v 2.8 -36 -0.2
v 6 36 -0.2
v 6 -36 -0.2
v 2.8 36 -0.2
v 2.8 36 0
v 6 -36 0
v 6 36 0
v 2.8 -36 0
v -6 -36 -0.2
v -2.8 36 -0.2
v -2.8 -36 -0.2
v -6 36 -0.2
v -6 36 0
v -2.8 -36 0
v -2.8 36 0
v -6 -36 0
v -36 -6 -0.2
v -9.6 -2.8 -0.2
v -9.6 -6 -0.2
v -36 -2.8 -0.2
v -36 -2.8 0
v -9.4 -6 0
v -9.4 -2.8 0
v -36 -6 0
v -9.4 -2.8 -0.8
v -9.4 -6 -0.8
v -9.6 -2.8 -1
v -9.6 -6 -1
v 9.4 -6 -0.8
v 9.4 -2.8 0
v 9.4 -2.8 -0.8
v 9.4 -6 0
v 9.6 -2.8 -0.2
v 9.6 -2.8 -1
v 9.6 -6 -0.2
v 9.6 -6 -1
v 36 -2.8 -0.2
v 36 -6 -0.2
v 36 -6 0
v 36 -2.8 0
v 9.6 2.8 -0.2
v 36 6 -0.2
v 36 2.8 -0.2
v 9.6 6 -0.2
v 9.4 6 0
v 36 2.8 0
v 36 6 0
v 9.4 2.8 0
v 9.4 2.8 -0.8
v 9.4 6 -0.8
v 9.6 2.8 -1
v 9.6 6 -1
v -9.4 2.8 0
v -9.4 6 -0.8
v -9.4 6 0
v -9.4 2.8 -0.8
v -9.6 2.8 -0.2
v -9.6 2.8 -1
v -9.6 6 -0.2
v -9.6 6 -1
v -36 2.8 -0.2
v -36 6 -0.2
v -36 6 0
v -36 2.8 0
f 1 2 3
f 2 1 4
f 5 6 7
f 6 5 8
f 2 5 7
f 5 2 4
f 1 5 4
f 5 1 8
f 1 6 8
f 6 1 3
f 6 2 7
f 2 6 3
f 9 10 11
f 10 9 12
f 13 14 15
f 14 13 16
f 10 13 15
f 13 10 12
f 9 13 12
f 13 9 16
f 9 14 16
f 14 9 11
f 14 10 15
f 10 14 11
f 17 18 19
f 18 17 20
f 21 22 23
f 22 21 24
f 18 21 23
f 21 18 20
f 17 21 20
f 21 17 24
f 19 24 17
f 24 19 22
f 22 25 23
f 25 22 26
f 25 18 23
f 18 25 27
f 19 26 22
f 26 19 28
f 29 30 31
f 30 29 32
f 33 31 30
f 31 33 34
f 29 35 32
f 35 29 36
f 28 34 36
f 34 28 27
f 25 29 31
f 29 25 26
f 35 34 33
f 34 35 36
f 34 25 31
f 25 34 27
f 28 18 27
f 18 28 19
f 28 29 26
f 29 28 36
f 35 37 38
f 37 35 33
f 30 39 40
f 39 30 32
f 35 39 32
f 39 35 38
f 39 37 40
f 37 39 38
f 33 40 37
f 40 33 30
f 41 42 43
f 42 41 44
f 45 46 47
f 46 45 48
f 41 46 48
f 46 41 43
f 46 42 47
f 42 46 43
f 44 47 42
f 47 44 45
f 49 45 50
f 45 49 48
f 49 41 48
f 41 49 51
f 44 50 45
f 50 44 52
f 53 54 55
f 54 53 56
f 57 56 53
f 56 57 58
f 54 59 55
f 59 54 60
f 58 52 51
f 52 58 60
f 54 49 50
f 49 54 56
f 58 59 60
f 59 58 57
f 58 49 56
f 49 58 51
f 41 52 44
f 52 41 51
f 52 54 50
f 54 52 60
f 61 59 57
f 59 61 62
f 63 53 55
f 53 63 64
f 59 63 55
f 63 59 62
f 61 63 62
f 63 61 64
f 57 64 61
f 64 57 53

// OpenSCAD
// file: ../../p/box.scad
use <../lib.scad>
function ldraw_lib__box() = [
// 0 Box 6 (six faces)
// 0 Name: box.dat
// 0 Author: James Jessiman
// 0 !LDRAW_ORG Primitive UPDATE 2002-05
// 0 !LICENSE Licensed under CC BY 2.0 and CC BY 4.0 : see CAreadme.txt
// 
// 0 BFC CERTIFY CCW
  [0,"BFC","CERTIFY"],
  [0,"BFC","CCW"],
// 
// 0 !HISTORY 2002-08-22 [sbliss] Applied BFC
// 0 !HISTORY 2002-11-30 [PTadmin] Official Update 2002-05
// 0 !HISTORY 2007-06-24 [PTadmin] Header formatted for Contributor Agreement
// 0 !HISTORY 2008-07-01 [PTadmin] Official Update 2008-01
// 
// 
// 2 24 1 1 1 -1 1 1
  [2,24,1,1,1,-1,1,1],
// 2 24 -1 1 1 -1 1 -1
  [2,24,-1,1,1,-1,1,-1],
// 2 24 -1 1 -1 1 1 -1
  [2,24,-1,1,-1,1,1,-1],
// 2 24 1 1 -1 1 1 1
  [2,24,1,1,-1,1,1,1],
// 2 24 1 -1 1 -1 -1 1
  [2,24,1,-1,1,-1,-1,1],
// 2 24 -1 -1 1 -1 -1 -1
  [2,24,-1,-1,1,-1,-1,-1],
// 2 24 -1 -1 -1 1 -1 -1
  [2,24,-1,-1,-1,1,-1,-1],
// 2 24 1 -1 -1 1 -1 1
  [2,24,1,-1,-1,1,-1,1],
// 2 24 1 -1 1 1 1 1
  [2,24,1,-1,1,1,1,1],
// 2 24 -1 -1 1 -1 1 1
  [2,24,-1,-1,1,-1,1,1],
// 2 24 1 -1 -1 1 1 -1
  [2,24,1,-1,-1,1,1,-1],
// 2 24 -1 -1 -1 -1 1 -1
  [2,24,-1,-1,-1,-1,1,-1],
// 4 16 1 1 1 1 1 -1 -1 1 -1 -1 1 1
  [4,16,1,1,1,1,1,-1,-1,1,-1,-1,1,1],
// 4 16 -1 -1 -1 1 -1 -1 1 -1 1 -1 -1 1
  [4,16,-1,-1,-1,1,-1,-1,1,-1,1,-1,-1,1],
// 4 16 -1 -1 1 1 -1 1 1 1 1 -1 1 1
  [4,16,-1,-1,1,1,-1,1,1,1,1,-1,1,1],
// 4 16 -1 -1 -1 -1 -1 1 -1 1 1 -1 1 -1
  [4,16,-1,-1,-1,-1,-1,1,-1,1,1,-1,1,-1],
// 4 16 1 -1 -1 -1 -1 -1 -1 1 -1 1 1 -1
  [4,16,1,-1,-1,-1,-1,-1,-1,1,-1,1,1,-1],
// 4 16 1 -1 1 1 -1 -1 1 1 -1 1 1 1
  [4,16,1,-1,1,1,-1,-1,1,1,-1,1,1,1],
// 0
];
makepoly(ldraw_lib__box(), line=0.2);
// main file
use <../../lib.scad>
use <../../p/box.scad>
function ldraw_lib__s__u9137s03() = [
// 0 ~Train Track 12V Crossing Bottom Metal Stripes
// 0 Name: s\u9137s03.dat
// 0 Author: Steffen [Steffen]
// 0 !LDRAW_ORG Subpart UPDATE 2012-01
// 0 !LICENSE Licensed under CC BY 2.0 and CC BY 4.0 : see CAreadme.txt
// 
// 0 BFC CERTIFY CCW
  [0,"BFC","CERTIFY"],
  [0,"BFC","CCW"],
// 
// 0 !HISTORY 2012-03-30 [PTadmin] Official Update 2012-01
// 
// 
// 1 16 11 0.25 0 4 0 0 0 0.25 0 0 0 90 box.dat
  [1,16,11,0.25,0,4,0,0,0,0.25,0,0,0,90, ldraw_lib__box()],
// 1 16 -11 0.25 0 4 0 0 0 0.25 0 0 0 90 box.dat
  [1,16,-11,0.25,0,4,0,0,0,0.25,0,0,0,90, ldraw_lib__box()],
// 4 16 -24 0.5 -15 -90 0.5 -15 -90 0.5 -7 -24 0.5 -7
  [4,16,-24,0.5,-15,-90,0.5,-15,-90,0.5,-7,-24,0.5,-7],
// 4 16 -90 0 -7 -90 0 -15 -23.5 0 -15 -23.5 0 -7
  [4,16,-90,0,-7,-90,0,-15,-23.5,0,-15,-23.5,0,-7],
// 4 16 -90 0 -7 -23.5 0 -7 -24 0.5 -7 -90 0.5 -7
  [4,16,-90,0,-7,-23.5,0,-7,-24,0.5,-7,-90,0.5,-7],
// 4 16 -90 0 -15 -90 0 -7 -90 0.5 -7 -90 0.5 -15
  [4,16,-90,0,-15,-90,0,-7,-90,0.5,-7,-90,0.5,-15],
// 4 16 -23.5 0 -15 -90 0 -15 -90 0.5 -15 -24 0.5 -15
  [4,16,-23.5,0,-15,-90,0,-15,-90,0.5,-15,-24,0.5,-15],
// 4 16 -23.5 0 -15 -23.5 2 -15 -23.5 2 -7 -23.5 0 -7
  [4,16,-23.5,0,-15,-23.5,2,-15,-23.5,2,-7,-23.5,0,-7],
// 4 16 -24 2.5 -7 -24 0.5 -7 -23.5 0 -7 -23.5 2 -7
  [4,16,-24,2.5,-7,-24,0.5,-7,-23.5,0,-7,-23.5,2,-7],
// 4 16 -24 0.5 -15 -24 2.5 -15 -23.5 2 -15 -23.5 0 -15
  [4,16,-24,0.5,-15,-24,2.5,-15,-23.5,2,-15,-23.5,0,-15],
// 4 16 23.5 2 -7 23.5 2 -15 23.5 0 -15 23.5 0 -7
  [4,16,23.5,2,-7,23.5,2,-15,23.5,0,-15,23.5,0,-7],
// 4 16 23.5 2 -7 23.5 0 -7 24 0.5 -7 24 2.5 -7
  [4,16,23.5,2,-7,23.5,0,-7,24,0.5,-7,24,2.5,-7],
// 4 16 23.5 0 -15 23.5 2 -15 24 2.5 -15 24 0.5 -15
  [4,16,23.5,0,-15,23.5,2,-15,24,2.5,-15,24,0.5,-15],
// 4 16 24 2.5 -15 -24 2.5 -15 -24 2.5 -7 24 2.5 -7
  [4,16,24,2.5,-15,-24,2.5,-15,-24,2.5,-7,24,2.5,-7],
// 4 16 -23.5 2 -7 -23.5 2 -15 23.5 2 -15 23.5 2 -7
  [4,16,-23.5,2,-7,-23.5,2,-15,23.5,2,-15,23.5,2,-7],
// 4 16 24 0.5 -7 24 0.5 -15 24 2.5 -15 24 2.5 -7
  [4,16,24,0.5,-7,24,0.5,-15,24,2.5,-15,24,2.5,-7],
// 4 16 -23.5 2 -7 23.5 2 -7 24 2.5 -7 -24 2.5 -7
  [4,16,-23.5,2,-7,23.5,2,-7,24,2.5,-7,-24,2.5,-7],
// 4 16 -24 0.5 -15 -24 0.5 -7 -24 2.5 -7 -24 2.5 -15
  [4,16,-24,0.5,-15,-24,0.5,-7,-24,2.5,-7,-24,2.5,-15],
// 4 16 23.5 2 -15 -23.5 2 -15 -24 2.5 -15 24 2.5 -15
  [4,16,23.5,2,-15,-23.5,2,-15,-24,2.5,-15,24,2.5,-15],
// 4 16 24 0.5 -7 90 0.5 -7 90 0.5 -15 24 0.5 -15
  [4,16,24,0.5,-7,90,0.5,-7,90,0.5,-15,24,0.5,-15],
// 4 16 90 0 -15 90 0 -7 23.5 0 -7 23.5 0 -15
  [4,16,90,0,-15,90,0,-7,23.5,0,-7,23.5,0,-15],
// 4 16 90 0 -15 23.5 0 -15 24 0.5 -15 90 0.5 -15
  [4,16,90,0,-15,23.5,0,-15,24,0.5,-15,90,0.5,-15],
// 4 16 90 0 -7 90 0 -15 90 0.5 -15 90 0.5 -7
  [4,16,90,0,-7,90,0,-15,90,0.5,-15,90,0.5,-7],
// 4 16 23.5 0 -7 90 0 -7 90 0.5 -7 24 0.5 -7
  [4,16,23.5,0,-7,90,0,-7,90,0.5,-7,24,0.5,-7],
// 2 24 -24 0.5 -15 -90 0.5 -15
  [2,24,-24,0.5,-15,-90,0.5,-15],
// 2 24 -90 0.5 -15 -90 0.5 -7
  [2,24,-90,0.5,-15,-90,0.5,-7],
// 2 24 -90 0.5 -7 -24 0.5 -7
  [2,24,-90,0.5,-7,-24,0.5,-7],
// 2 24 -24 0.5 -7 -24 0.5 -15
  [2,24,-24,0.5,-7,-24,0.5,-15],
// 2 24 -90 0 -7 -90 0 -15
  [2,24,-90,0,-7,-90,0,-15],
// 2 24 -90 0 -15 -23.5 0 -15
  [2,24,-90,0,-15,-23.5,0,-15],
// 2 24 -23.5 0 -15 -23.5 0 -7
  [2,24,-23.5,0,-15,-23.5,0,-7],
// 2 24 -23.5 0 -7 -90 0 -7
  [2,24,-23.5,0,-7,-90,0,-7],
// 2 24 -90 0.5 -7 -90 0 -7
  [2,24,-90,0.5,-7,-90,0,-7],
// 2 24 -90 0.5 -15 -90 0 -15
  [2,24,-90,0.5,-15,-90,0,-15],
// 2 24 -23.5 0 -15 -23.5 2 -15
  [2,24,-23.5,0,-15,-23.5,2,-15],
// 2 24 -23.5 2 -15 -23.5 2 -7
  [2,24,-23.5,2,-15,-23.5,2,-7],
// 2 24 -23.5 2 -7 -23.5 0 -7
  [2,24,-23.5,2,-7,-23.5,0,-7],
// 2 24 -24 2.5 -7 -24 0.5 -7
  [2,24,-24,2.5,-7,-24,0.5,-7],
// 2 24 -24 0.5 -15 -24 2.5 -15
  [2,24,-24,0.5,-15,-24,2.5,-15],
// 2 24 23.5 2 -7 23.5 2 -15
  [2,24,23.5,2,-7,23.5,2,-15],
// 2 24 23.5 2 -15 23.5 0 -15
  [2,24,23.5,2,-15,23.5,0,-15],
// 2 24 23.5 0 -15 23.5 0 -7
  [2,24,23.5,0,-15,23.5,0,-7],
// 2 24 23.5 0 -7 23.5 2 -7
  [2,24,23.5,0,-7,23.5,2,-7],
// 2 24 24 0.5 -7 24 2.5 -7
  [2,24,24,0.5,-7,24,2.5,-7],
// 2 24 24 2.5 -15 24 0.5 -15
  [2,24,24,2.5,-15,24,0.5,-15],
// 2 24 24 2.5 -15 -24 2.5 -15
  [2,24,24,2.5,-15,-24,2.5,-15],
// 2 24 -24 2.5 -15 -24 2.5 -7
  [2,24,-24,2.5,-15,-24,2.5,-7],
// 2 24 -24 2.5 -7 24 2.5 -7
  [2,24,-24,2.5,-7,24,2.5,-7],
// 2 24 24 2.5 -7 24 2.5 -15
  [2,24,24,2.5,-7,24,2.5,-15],
// 2 24 -23.5 2 -15 23.5 2 -15
  [2,24,-23.5,2,-15,23.5,2,-15],
// 2 24 23.5 2 -7 -23.5 2 -7
  [2,24,23.5,2,-7,-23.5,2,-7],
// 2 24 24 0.5 -7 24 0.5 -15
  [2,24,24,0.5,-7,24,0.5,-15],
// 2 24 24 0.5 -7 90 0.5 -7
  [2,24,24,0.5,-7,90,0.5,-7],
// 2 24 90 0.5 -7 90 0.5 -15
  [2,24,90,0.5,-7,90,0.5,-15],
// 2 24 90 0.5 -15 24 0.5 -15
  [2,24,90,0.5,-15,24,0.5,-15],
// 2 24 90 0 -15 90 0 -7
  [2,24,90,0,-15,90,0,-7],
// 2 24 90 0 -7 23.5 0 -7
  [2,24,90,0,-7,23.5,0,-7],
// 2 24 23.5 0 -15 90 0 -15
  [2,24,23.5,0,-15,90,0,-15],
// 2 24 90 0.5 -15 90 0 -15
  [2,24,90,0.5,-15,90,0,-15],
// 2 24 90 0.5 -7 90 0 -7
  [2,24,90,0.5,-7,90,0,-7],
// 4 16 24 0.5 15 90 0.5 15 90 0.5 7 24 0.5 7
  [4,16,24,0.5,15,90,0.5,15,90,0.5,7,24,0.5,7],
// 4 16 90 0 7 90 0 15 23.5 0 15 23.5 0 7
  [4,16,90,0,7,90,0,15,23.5,0,15,23.5,0,7],
// 4 16 90 0 7 23.5 0 7 24 0.5 7 90 0.5 7
  [4,16,90,0,7,23.5,0,7,24,0.5,7,90,0.5,7],
// 4 16 90 0 15 90 0 7 90 0.5 7 90 0.5 15
  [4,16,90,0,15,90,0,7,90,0.5,7,90,0.5,15],
// 4 16 23.5 0 15 90 0 15 90 0.5 15 24 0.5 15
  [4,16,23.5,0,15,90,0,15,90,0.5,15,24,0.5,15],
// 4 16 23.5 0 15 23.5 2 15 23.5 2 7 23.5 0 7
  [4,16,23.5,0,15,23.5,2,15,23.5,2,7,23.5,0,7],
// 4 16 24 2.5 7 24 0.5 7 23.5 0 7 23.5 2 7
  [4,16,24,2.5,7,24,0.5,7,23.5,0,7,23.5,2,7],
// 4 16 24 0.5 15 24 2.5 15 23.5 2 15 23.5 0 15
  [4,16,24,0.5,15,24,2.5,15,23.5,2,15,23.5,0,15],
// 4 16 -23.5 2 7 -23.5 2 15 -23.5 0 15 -23.5 0 7
  [4,16,-23.5,2,7,-23.5,2,15,-23.5,0,15,-23.5,0,7],
// 4 16 -23.5 2 7 -23.5 0 7 -24 0.5 7 -24 2.5 7
  [4,16,-23.5,2,7,-23.5,0,7,-24,0.5,7,-24,2.5,7],
// 4 16 -23.5 0 15 -23.5 2 15 -24 2.5 15 -24 0.5 15
  [4,16,-23.5,0,15,-23.5,2,15,-24,2.5,15,-24,0.5,15],
// 4 16 -24 2.5 15 24 2.5 15 24 2.5 7 -24 2.5 7
  [4,16,-24,2.5,15,24,2.5,15,24,2.5,7,-24,2.5,7],
// 4 16 23.5 2 7 23.5 2 15 -23.5 2 15 -23.5 2 7
  [4,16,23.5,2,7,23.5,2,15,-23.5,2,15,-23.5,2,7],
// 4 16 -24 0.5 7 -24 0.5 15 -24 2.5 15 -24 2.5 7
  [4,16,-24,0.5,7,-24,0.5,15,-24,2.5,15,-24,2.5,7],
// 4 16 23.5 2 7 -23.5 2 7 -24 2.5 7 24 2.5 7
  [4,16,23.5,2,7,-23.5,2,7,-24,2.5,7,24,2.5,7],
// 4 16 24 0.5 15 24 0.5 7 24 2.5 7 24 2.5 15
  [4,16,24,0.5,15,24,0.5,7,24,2.5,7,24,2.5,15],
// 4 16 -23.5 2 15 23.5 2 15 24 2.5 15 -24 2.5 15
  [4,16,-23.5,2,15,23.5,2,15,24,2.5,15,-24,2.5,15],
// 4 16 -24 0.5 7 -90 0.5 7 -90 0.5 15 -24 0.5 15
  [4,16,-24,0.5,7,-90,0.5,7,-90,0.5,15,-24,0.5,15],
// 4 16 -90 0 15 -90 0 7 -23.5 0 7 -23.5 0 15
  [4,16,-90,0,15,-90,0,7,-23.5,0,7,-23.5,0,15],
// 4 16 -90 0 15 -23.5 0 15 -24 0.5 15 -90 0.5 15
  [4,16,-90,0,15,-23.5,0,15,-24,0.5,15,-90,0.5,15],
// 4 16 -90 0 7 -90 0 15 -90 0.5 15 -90 0.5 7
  [4,16,-90,0,7,-90,0,15,-90,0.5,15,-90,0.5,7],
// 4 16 -23.5 0 7 -90 0 7 -90 0.5 7 -24 0.5 7
  [4,16,-23.5,0,7,-90,0,7,-90,0.5,7,-24,0.5,7],
// 2 24 24 0.5 15 90 0.5 15
  [2,24,24,0.5,15,90,0.5,15],
// 2 24 90 0.5 15 90 0.5 7
  [2,24,90,0.5,15,90,0.5,7],
// 2 24 90 0.5 7 24 0.5 7
  [2,24,90,0.5,7,24,0.5,7],
// 2 24 24 0.5 7 24 0.5 15
  [2,24,24,0.5,7,24,0.5,15],
// 2 24 90 0 7 90 0 15
  [2,24,90,0,7,90,0,15],
// 2 24 90 0 15 23.5 0 15
  [2,24,90,0,15,23.5,0,15],
// 2 24 23.5 0 15 23.5 0 7
  [2,24,23.5,0,15,23.5,0,7],
// 2 24 23.5 0 7 90 0 7
  [2,24,23.5,0,7,90,0,7],
// 2 24 90 0.5 7 90 0 7
  [2,24,90,0.5,7,90,0,7],
// 2 24 90 0.5 15 90 0 15
  [2,24,90,0.5,15,90,0,15],
// 2 24 23.5 0 15 23.5 2 15
  [2,24,23.5,0,15,23.5,2,15],
// 2 24 23.5 2 15 23.5 2 7
  [2,24,23.5,2,15,23.5,2,7],
// 2 24 23.5 2 7 23.5 0 7
  [2,24,23.5,2,7,23.5,0,7],
// 2 24 24 2.5 7 24 0.5 7
  [2,24,24,2.5,7,24,0.5,7],
// 2 24 24 0.5 15 24 2.5 15
  [2,24,24,0.5,15,24,2.5,15],
// 2 24 -23.5 2 7 -23.5 2 15
  [2,24,-23.5,2,7,-23.5,2,15],
// 2 24 -23.5 2 15 -23.5 0 15
  [2,24,-23.5,2,15,-23.5,0,15],
// 2 24 -23.5 0 15 -23.5 0 7
  [2,24,-23.5,0,15,-23.5,0,7],
// 2 24 -23.5 0 7 -23.5 2 7
  [2,24,-23.5,0,7,-23.5,2,7],
// 2 24 -24 0.5 7 -24 2.5 7
  [2,24,-24,0.5,7,-24,2.5,7],
// 2 24 -24 2.5 15 -24 0.5 15
  [2,24,-24,2.5,15,-24,0.5,15],
// 2 24 -24 2.5 15 24 2.5 15
  [2,24,-24,2.5,15,24,2.5,15],
// 2 24 24 2.5 15 24 2.5 7
  [2,24,24,2.5,15,24,2.5,7],
// 2 24 24 2.5 7 -24 2.5 7
  [2,24,24,2.5,7,-24,2.5,7],
// 2 24 -24 2.5 7 -24 2.5 15
  [2,24,-24,2.5,7,-24,2.5,15],
// 2 24 23.5 2 15 -23.5 2 15
  [2,24,23.5,2,15,-23.5,2,15],
// 2 24 -23.5 2 7 23.5 2 7
  [2,24,-23.5,2,7,23.5,2,7],
// 2 24 -24 0.5 7 -24 0.5 15
  [2,24,-24,0.5,7,-24,0.5,15],
// 2 24 -24 0.5 7 -90 0.5 7
  [2,24,-24,0.5,7,-90,0.5,7],
// 2 24 -90 0.5 7 -90 0.5 15
  [2,24,-90,0.5,7,-90,0.5,15],
// 2 24 -90 0.5 15 -24 0.5 15
  [2,24,-90,0.5,15,-24,0.5,15],
// 2 24 -90 0 15 -90 0 7
  [2,24,-90,0,15,-90,0,7],
// 2 24 -90 0 7 -23.5 0 7
  [2,24,-90,0,7,-23.5,0,7],
// 2 24 -23.5 0 15 -90 0 15
  [2,24,-23.5,0,15,-90,0,15],
// 2 24 -90 0.5 15 -90 0 15
  [2,24,-90,0.5,15,-90,0,15],
// 2 24 -90 0.5 7 -90 0 7
  [2,24,-90,0.5,7,-90,0,7],
];
makepoly(ldraw_lib__s__u9137s03(), line=0.2);
